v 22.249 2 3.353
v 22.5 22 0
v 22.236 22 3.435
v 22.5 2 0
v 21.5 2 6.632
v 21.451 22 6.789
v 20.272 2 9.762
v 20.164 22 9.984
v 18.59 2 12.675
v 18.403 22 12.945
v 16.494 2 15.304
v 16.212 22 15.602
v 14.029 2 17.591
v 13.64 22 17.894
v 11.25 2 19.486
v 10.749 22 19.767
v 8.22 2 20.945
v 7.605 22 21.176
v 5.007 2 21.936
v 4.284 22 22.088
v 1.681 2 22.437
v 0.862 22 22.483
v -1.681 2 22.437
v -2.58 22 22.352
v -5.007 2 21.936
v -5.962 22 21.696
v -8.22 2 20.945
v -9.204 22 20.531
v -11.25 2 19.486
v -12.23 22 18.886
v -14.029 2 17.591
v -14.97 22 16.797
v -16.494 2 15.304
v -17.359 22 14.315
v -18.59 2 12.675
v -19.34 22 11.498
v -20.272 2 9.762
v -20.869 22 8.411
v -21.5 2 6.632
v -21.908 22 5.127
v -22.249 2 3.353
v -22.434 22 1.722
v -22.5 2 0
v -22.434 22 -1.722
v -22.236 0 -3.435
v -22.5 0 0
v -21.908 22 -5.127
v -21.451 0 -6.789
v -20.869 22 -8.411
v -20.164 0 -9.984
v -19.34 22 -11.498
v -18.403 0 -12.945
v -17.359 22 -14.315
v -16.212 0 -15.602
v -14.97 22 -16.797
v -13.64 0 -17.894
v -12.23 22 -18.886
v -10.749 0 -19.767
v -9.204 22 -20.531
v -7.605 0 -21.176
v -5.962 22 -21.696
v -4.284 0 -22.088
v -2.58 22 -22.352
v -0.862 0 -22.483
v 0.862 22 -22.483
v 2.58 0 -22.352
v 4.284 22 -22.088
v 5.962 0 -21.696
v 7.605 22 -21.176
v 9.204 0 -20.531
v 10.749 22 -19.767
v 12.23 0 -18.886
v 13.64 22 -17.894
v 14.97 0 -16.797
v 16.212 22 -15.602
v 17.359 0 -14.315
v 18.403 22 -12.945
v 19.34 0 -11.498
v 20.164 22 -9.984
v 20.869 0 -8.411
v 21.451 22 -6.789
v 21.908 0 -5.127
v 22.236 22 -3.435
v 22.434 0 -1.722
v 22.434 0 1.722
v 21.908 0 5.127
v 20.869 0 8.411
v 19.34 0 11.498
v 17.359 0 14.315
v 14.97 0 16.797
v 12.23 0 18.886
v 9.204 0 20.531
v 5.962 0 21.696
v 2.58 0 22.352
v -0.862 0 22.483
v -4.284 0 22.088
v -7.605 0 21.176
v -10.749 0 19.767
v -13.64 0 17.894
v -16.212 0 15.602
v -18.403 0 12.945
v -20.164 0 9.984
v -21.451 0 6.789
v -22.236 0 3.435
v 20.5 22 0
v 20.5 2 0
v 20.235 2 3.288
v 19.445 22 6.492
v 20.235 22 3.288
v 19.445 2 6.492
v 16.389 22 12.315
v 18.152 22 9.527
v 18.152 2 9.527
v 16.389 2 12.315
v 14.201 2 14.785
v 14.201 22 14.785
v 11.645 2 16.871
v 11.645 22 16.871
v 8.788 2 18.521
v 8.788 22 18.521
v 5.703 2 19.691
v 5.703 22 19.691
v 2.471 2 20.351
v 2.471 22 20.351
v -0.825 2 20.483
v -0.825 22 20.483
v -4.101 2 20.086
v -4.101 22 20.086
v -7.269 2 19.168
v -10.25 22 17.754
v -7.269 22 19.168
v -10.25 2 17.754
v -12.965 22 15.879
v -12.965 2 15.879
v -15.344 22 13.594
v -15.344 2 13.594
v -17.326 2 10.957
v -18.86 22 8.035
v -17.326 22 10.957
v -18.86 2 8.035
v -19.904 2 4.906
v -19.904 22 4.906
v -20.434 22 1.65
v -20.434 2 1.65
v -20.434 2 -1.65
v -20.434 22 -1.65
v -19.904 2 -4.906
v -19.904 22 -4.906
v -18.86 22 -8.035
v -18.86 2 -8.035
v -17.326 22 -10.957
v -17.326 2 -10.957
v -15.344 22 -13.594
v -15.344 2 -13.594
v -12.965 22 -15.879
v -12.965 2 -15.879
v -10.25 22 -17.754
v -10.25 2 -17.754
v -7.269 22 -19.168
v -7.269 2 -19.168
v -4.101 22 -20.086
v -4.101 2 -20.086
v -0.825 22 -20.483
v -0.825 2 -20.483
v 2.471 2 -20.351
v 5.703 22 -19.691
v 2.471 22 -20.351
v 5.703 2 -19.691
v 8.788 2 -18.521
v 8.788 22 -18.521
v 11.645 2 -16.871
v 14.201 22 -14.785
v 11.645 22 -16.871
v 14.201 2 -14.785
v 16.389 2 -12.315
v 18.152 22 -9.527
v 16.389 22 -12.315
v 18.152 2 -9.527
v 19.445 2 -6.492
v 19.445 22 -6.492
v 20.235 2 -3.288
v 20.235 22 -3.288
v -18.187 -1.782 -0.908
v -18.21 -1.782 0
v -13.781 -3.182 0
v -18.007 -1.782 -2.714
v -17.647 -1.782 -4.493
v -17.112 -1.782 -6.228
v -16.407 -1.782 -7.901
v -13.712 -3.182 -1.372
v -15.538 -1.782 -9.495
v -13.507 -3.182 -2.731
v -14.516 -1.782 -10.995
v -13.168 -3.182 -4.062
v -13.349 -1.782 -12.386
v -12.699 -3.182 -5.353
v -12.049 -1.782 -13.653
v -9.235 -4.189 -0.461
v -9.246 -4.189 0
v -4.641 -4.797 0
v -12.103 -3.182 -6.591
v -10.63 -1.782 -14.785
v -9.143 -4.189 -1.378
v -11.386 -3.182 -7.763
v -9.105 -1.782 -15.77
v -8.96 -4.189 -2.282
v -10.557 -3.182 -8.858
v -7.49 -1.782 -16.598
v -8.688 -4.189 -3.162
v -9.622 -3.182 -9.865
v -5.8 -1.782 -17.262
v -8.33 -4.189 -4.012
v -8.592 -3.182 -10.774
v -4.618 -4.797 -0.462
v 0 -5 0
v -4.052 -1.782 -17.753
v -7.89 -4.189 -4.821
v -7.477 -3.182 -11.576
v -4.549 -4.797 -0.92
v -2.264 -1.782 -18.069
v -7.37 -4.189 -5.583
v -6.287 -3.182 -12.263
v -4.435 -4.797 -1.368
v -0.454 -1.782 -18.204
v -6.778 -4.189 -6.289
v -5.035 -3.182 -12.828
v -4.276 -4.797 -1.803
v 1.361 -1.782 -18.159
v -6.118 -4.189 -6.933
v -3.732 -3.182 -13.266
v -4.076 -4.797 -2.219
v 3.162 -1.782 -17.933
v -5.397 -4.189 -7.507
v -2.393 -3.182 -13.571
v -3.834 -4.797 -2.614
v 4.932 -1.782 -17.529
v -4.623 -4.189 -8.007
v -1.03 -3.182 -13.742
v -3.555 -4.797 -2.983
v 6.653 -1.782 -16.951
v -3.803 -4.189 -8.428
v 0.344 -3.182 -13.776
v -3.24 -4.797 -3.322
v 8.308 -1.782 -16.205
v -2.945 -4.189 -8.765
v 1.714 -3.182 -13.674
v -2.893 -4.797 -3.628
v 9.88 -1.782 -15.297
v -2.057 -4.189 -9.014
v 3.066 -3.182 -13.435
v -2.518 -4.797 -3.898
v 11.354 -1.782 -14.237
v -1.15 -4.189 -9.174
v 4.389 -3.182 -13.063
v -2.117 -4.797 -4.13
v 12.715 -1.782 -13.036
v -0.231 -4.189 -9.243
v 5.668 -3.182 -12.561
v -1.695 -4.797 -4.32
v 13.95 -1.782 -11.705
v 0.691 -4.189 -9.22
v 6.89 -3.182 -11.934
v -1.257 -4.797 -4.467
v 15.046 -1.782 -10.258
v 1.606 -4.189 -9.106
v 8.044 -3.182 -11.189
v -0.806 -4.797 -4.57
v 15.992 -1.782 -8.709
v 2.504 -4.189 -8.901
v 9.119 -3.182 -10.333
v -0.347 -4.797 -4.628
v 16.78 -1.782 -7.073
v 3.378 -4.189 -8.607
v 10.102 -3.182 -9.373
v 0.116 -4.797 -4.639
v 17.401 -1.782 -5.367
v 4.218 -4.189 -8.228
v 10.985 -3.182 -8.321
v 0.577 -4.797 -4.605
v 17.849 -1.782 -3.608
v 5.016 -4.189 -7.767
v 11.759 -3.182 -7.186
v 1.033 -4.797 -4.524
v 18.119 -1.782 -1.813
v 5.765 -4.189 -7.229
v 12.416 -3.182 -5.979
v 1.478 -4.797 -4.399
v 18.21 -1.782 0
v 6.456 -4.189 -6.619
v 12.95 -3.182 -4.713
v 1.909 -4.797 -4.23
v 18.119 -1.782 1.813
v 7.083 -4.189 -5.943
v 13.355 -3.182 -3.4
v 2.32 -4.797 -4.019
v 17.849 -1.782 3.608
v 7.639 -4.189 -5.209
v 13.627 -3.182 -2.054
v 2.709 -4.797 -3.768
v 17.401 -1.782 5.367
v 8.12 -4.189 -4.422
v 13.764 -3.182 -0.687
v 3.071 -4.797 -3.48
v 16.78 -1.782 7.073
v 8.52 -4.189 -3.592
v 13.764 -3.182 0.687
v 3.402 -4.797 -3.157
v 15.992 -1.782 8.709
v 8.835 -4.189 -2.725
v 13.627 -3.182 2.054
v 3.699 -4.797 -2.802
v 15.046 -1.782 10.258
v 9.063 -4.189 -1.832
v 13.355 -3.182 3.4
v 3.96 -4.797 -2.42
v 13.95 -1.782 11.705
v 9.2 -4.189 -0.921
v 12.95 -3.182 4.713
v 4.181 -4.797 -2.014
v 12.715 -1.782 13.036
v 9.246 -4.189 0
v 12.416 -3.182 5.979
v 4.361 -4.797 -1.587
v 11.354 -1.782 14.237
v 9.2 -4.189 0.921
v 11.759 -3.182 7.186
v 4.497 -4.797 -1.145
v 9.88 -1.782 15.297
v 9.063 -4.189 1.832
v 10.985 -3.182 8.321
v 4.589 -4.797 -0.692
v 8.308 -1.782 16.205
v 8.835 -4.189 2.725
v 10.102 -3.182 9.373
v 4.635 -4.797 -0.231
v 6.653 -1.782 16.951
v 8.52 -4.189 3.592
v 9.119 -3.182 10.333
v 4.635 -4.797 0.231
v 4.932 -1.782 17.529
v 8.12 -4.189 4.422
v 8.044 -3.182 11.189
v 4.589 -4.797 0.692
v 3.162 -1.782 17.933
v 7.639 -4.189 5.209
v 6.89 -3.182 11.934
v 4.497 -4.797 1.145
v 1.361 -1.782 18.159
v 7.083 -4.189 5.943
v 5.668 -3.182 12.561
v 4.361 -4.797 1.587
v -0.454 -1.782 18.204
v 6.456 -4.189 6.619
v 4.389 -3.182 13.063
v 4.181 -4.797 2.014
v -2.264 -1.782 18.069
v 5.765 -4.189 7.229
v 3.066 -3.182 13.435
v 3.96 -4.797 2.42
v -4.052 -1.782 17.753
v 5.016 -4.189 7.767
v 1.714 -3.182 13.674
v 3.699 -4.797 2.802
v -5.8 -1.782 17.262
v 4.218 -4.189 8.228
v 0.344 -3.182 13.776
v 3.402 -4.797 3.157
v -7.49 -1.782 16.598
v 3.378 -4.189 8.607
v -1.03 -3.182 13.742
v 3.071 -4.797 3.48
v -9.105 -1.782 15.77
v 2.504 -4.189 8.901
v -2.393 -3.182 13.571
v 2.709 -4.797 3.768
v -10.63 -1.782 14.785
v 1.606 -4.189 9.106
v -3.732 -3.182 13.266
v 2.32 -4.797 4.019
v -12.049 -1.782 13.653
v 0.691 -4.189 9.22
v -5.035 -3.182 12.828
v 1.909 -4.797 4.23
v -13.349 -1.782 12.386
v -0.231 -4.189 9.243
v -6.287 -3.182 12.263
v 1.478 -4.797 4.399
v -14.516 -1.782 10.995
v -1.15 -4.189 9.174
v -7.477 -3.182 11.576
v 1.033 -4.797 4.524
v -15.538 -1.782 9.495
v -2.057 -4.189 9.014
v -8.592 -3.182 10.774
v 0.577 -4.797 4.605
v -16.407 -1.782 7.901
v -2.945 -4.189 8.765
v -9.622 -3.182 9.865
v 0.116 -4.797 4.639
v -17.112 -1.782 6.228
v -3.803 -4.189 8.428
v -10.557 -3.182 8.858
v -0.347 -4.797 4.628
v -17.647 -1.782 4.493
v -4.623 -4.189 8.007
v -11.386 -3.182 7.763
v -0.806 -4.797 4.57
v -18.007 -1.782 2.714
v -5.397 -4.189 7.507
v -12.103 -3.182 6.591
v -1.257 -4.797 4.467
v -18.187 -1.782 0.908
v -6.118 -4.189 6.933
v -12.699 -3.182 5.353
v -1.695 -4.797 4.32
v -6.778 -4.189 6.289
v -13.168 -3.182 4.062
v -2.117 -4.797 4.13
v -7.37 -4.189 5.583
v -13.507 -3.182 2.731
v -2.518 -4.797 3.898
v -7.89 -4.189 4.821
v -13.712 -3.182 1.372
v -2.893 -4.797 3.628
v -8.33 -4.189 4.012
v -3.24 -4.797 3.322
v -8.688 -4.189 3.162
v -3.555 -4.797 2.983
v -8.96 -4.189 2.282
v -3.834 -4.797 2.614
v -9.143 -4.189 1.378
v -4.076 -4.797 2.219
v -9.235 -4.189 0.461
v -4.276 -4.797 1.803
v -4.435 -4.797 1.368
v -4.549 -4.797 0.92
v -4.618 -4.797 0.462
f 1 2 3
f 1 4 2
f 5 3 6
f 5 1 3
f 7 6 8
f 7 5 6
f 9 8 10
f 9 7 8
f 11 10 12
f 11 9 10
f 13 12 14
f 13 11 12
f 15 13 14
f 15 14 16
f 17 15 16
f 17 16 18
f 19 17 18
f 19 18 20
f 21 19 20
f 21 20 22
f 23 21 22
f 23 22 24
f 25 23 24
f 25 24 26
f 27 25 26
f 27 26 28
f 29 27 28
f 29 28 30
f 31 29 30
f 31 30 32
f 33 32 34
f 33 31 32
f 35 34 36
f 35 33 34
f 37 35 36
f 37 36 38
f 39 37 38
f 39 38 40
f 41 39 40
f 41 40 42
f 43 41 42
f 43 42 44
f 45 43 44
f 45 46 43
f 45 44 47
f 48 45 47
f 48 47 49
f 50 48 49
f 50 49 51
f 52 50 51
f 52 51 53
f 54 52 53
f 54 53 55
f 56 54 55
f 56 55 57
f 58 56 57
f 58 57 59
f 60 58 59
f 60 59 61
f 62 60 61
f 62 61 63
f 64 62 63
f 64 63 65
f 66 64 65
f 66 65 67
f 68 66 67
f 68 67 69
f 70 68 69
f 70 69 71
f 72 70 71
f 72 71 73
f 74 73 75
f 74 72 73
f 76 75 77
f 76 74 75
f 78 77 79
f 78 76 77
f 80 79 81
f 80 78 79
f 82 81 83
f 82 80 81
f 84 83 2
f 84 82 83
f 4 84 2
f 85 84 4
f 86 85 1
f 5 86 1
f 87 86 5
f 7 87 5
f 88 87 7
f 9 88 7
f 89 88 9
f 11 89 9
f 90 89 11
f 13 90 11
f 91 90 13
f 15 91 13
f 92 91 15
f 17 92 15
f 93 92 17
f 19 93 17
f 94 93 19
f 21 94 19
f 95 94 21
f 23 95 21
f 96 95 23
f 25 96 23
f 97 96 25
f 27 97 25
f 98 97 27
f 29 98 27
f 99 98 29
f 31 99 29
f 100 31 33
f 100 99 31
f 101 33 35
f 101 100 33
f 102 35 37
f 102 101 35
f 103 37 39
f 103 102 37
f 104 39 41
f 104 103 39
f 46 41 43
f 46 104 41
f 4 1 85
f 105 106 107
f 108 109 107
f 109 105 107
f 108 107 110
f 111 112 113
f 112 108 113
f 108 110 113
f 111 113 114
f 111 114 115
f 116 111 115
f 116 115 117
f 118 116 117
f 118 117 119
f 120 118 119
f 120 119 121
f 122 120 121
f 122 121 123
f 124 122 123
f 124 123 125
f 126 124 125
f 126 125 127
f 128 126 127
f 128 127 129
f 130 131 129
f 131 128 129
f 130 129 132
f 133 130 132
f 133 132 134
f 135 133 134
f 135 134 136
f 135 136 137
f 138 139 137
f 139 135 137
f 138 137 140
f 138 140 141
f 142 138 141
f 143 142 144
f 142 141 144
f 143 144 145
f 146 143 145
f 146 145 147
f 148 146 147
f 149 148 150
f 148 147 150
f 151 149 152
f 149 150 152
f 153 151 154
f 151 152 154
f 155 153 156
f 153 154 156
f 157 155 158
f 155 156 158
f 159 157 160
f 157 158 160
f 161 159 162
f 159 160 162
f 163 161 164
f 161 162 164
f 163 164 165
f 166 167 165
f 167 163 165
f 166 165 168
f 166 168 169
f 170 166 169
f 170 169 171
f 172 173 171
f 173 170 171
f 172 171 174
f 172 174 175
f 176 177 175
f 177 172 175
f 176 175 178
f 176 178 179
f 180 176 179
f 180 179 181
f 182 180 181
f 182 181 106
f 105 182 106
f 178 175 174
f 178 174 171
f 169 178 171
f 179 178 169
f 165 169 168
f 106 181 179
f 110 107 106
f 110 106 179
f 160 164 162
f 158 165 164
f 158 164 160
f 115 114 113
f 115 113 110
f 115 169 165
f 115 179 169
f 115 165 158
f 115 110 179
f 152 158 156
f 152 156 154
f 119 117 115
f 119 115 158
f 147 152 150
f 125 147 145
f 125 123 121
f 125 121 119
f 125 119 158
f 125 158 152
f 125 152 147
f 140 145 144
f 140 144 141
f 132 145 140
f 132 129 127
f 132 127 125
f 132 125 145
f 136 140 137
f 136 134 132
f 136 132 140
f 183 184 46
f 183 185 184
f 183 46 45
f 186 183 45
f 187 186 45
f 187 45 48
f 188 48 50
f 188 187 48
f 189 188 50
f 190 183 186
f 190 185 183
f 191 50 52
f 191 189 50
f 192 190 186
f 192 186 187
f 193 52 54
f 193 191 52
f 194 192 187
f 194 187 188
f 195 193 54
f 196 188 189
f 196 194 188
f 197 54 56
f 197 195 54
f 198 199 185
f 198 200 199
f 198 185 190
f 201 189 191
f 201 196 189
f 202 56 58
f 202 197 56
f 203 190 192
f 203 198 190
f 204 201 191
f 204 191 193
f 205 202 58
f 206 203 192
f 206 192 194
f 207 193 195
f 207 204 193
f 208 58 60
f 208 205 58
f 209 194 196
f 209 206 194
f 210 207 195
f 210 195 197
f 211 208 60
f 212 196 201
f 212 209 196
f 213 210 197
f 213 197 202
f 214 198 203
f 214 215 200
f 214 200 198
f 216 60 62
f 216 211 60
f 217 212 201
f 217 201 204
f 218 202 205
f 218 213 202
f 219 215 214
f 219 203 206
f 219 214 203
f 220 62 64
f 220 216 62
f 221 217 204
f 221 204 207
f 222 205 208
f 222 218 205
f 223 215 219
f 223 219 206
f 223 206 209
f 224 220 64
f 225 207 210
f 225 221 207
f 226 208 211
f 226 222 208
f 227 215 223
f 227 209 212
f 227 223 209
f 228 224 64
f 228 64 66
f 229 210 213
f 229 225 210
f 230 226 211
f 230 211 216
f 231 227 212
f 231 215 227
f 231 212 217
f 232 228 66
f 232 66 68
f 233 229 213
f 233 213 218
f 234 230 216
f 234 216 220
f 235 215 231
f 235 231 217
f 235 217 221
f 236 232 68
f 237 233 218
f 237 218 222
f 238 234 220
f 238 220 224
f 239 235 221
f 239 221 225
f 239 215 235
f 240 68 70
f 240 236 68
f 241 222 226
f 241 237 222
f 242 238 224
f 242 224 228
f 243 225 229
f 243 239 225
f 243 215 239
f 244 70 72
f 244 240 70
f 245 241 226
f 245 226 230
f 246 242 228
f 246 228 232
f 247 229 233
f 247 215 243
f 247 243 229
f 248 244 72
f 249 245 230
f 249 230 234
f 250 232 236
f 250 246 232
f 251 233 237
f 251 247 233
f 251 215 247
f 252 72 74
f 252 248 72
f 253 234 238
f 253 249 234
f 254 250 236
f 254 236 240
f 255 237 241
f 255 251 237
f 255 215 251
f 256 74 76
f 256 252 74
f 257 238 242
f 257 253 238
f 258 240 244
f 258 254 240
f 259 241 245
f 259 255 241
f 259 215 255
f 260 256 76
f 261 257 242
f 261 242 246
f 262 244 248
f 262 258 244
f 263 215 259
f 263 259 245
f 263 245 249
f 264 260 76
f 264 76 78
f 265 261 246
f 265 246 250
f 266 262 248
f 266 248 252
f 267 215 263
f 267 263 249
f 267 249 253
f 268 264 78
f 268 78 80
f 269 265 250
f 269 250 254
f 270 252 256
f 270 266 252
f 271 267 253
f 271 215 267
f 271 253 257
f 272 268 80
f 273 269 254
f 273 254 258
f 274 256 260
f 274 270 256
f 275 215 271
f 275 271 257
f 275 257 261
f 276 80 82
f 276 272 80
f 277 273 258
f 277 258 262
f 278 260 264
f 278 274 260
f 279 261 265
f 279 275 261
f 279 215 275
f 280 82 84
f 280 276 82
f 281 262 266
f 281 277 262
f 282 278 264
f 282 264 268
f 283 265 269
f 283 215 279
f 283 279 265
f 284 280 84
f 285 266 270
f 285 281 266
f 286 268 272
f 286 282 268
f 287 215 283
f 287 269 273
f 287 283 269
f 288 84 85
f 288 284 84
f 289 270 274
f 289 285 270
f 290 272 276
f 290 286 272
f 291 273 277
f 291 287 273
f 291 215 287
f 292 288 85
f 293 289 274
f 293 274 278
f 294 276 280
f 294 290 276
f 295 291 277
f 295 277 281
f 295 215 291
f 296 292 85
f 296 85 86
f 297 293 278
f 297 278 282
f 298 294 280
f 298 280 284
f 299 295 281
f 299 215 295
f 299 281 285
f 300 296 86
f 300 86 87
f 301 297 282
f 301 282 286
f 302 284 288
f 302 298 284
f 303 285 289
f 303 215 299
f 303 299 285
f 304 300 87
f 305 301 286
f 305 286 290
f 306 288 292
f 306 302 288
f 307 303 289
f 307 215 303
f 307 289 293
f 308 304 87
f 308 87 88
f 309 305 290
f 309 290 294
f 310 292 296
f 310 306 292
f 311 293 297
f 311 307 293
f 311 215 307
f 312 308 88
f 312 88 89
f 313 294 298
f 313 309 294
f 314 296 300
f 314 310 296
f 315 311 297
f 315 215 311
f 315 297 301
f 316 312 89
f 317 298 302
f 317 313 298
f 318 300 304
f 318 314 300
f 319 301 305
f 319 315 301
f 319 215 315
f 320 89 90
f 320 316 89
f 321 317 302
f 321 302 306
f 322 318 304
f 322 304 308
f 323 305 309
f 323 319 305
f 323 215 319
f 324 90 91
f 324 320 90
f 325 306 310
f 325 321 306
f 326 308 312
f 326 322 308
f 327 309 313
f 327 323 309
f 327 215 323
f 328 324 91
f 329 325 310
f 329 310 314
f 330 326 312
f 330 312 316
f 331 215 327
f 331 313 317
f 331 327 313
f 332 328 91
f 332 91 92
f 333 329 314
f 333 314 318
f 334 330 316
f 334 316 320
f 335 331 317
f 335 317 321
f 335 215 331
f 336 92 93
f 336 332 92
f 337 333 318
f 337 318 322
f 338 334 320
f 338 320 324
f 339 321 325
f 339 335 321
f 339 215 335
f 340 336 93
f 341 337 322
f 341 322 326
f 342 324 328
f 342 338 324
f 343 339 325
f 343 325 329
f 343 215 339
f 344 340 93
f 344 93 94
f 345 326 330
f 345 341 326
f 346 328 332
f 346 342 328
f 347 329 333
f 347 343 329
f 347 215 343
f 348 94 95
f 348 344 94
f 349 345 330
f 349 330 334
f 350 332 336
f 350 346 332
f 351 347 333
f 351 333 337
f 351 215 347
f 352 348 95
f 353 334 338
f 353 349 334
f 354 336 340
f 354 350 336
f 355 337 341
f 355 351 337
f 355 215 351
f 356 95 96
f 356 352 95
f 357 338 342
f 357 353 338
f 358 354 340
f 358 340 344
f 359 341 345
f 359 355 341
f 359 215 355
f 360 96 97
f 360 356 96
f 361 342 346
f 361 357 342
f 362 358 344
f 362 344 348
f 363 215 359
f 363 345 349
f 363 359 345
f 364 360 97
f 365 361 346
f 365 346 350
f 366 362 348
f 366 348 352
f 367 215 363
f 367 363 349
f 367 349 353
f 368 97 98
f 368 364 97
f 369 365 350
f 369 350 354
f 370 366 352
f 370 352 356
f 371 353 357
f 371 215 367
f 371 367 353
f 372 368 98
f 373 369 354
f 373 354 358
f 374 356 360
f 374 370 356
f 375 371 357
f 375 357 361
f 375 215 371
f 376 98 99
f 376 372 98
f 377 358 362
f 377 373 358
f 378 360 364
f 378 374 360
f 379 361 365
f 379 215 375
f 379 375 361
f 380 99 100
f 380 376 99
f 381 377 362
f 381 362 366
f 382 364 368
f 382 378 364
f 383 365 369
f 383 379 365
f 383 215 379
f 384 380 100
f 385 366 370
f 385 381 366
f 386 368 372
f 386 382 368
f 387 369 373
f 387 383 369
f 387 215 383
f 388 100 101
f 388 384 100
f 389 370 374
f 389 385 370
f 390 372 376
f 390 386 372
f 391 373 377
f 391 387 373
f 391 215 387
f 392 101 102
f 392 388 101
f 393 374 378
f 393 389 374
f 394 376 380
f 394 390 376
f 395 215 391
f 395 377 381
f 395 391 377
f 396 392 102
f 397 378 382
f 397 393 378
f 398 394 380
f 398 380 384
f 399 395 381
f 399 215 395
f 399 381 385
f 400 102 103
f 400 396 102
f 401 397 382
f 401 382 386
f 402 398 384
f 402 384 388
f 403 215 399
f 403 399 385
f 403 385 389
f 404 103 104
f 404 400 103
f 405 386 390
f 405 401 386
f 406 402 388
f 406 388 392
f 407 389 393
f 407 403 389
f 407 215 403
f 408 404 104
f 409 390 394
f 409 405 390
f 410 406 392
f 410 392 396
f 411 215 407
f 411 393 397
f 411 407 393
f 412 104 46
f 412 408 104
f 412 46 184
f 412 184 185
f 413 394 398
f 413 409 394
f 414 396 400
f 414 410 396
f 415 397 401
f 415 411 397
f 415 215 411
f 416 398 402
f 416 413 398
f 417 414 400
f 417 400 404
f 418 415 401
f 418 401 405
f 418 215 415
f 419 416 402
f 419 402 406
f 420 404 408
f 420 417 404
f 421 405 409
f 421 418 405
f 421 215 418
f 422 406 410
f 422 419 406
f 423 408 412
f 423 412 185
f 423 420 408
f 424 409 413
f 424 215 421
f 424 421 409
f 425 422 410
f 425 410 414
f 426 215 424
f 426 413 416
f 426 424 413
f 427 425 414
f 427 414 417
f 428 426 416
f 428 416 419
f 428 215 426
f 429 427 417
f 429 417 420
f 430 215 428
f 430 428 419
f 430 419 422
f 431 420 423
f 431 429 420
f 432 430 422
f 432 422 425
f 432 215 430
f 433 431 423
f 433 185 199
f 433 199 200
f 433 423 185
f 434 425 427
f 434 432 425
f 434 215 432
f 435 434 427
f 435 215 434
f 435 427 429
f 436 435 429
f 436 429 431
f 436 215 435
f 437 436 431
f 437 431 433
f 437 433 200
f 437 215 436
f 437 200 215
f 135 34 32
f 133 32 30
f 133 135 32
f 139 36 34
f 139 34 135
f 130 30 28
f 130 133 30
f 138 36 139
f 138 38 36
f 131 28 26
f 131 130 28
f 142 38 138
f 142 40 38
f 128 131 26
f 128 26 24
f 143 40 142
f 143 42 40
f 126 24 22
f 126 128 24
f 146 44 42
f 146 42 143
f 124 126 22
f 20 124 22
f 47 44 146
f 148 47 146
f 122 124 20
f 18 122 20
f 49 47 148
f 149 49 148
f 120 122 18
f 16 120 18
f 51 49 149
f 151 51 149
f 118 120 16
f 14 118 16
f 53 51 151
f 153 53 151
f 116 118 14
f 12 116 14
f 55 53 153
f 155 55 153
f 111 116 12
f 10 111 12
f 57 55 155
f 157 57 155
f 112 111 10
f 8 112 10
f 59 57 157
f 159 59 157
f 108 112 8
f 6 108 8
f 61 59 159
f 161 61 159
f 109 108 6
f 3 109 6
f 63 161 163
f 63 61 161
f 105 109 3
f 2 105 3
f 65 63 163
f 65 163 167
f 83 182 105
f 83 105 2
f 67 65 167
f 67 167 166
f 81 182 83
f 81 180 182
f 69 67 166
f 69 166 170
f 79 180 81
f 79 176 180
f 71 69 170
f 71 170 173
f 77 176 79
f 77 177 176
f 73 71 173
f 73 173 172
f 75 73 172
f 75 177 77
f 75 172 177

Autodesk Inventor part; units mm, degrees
ref_plane "YZ Plane" through (0, 0, 0) normal (1, 0, 0) x (0, 1, 0)
ref_plane "XZ Plane" through (0, 0, 0) normal (0, 1, 0) x (-1, 0, 0)
ref_plane "XY Plane" through (0, 0, 0) normal (0, 0, 1) x (1, 0, 0)
sketch "Sketch1" plane through (0, 0, 0) normal (0, 1, 0) x (-1, 0, 0)
  circle A0 centre (0, 0) radius 22.5
  dimension "d0" = 45
extrude "Extrusion1" add sketch "Sketch1" along normal blind 2
sketch "Sketch2" plane through (0, 2, 0) normal (0, 1, 0) x (1, 0, 0)
  circle A0 centre (0, 0) radius 22.5 projected
  circle A1 centre (0, 0) radius 22.5 projected
  circle A2 centre (0, 0) radius 20.5
  dimension "d3" = 2
extrude "Extrusion2" add sketch "Sketch2" along normal blind 20
sketch "Sketch3" plane through (0, 0, 0) normal (0, 0, 1) x (1, 0, 0)
  line L0 (22.5, 0) -> (-22.5, 0) projected
  line L1 (22.5, 0) -> (0, 0)
  line L2 (0, 0) -> (0, -5)
  arc A0 (-22.5, 0) -> (0, -5) centre (0, 48.125) ccw
  dimension "d6" = 5
revolve "Revolution1" add sketch "Sketch3" angle 360 about axis through (0, 0, 0) along (0, -1, 0)
properties part number "Pieza 1.1 final" material "ABS Plastic"
